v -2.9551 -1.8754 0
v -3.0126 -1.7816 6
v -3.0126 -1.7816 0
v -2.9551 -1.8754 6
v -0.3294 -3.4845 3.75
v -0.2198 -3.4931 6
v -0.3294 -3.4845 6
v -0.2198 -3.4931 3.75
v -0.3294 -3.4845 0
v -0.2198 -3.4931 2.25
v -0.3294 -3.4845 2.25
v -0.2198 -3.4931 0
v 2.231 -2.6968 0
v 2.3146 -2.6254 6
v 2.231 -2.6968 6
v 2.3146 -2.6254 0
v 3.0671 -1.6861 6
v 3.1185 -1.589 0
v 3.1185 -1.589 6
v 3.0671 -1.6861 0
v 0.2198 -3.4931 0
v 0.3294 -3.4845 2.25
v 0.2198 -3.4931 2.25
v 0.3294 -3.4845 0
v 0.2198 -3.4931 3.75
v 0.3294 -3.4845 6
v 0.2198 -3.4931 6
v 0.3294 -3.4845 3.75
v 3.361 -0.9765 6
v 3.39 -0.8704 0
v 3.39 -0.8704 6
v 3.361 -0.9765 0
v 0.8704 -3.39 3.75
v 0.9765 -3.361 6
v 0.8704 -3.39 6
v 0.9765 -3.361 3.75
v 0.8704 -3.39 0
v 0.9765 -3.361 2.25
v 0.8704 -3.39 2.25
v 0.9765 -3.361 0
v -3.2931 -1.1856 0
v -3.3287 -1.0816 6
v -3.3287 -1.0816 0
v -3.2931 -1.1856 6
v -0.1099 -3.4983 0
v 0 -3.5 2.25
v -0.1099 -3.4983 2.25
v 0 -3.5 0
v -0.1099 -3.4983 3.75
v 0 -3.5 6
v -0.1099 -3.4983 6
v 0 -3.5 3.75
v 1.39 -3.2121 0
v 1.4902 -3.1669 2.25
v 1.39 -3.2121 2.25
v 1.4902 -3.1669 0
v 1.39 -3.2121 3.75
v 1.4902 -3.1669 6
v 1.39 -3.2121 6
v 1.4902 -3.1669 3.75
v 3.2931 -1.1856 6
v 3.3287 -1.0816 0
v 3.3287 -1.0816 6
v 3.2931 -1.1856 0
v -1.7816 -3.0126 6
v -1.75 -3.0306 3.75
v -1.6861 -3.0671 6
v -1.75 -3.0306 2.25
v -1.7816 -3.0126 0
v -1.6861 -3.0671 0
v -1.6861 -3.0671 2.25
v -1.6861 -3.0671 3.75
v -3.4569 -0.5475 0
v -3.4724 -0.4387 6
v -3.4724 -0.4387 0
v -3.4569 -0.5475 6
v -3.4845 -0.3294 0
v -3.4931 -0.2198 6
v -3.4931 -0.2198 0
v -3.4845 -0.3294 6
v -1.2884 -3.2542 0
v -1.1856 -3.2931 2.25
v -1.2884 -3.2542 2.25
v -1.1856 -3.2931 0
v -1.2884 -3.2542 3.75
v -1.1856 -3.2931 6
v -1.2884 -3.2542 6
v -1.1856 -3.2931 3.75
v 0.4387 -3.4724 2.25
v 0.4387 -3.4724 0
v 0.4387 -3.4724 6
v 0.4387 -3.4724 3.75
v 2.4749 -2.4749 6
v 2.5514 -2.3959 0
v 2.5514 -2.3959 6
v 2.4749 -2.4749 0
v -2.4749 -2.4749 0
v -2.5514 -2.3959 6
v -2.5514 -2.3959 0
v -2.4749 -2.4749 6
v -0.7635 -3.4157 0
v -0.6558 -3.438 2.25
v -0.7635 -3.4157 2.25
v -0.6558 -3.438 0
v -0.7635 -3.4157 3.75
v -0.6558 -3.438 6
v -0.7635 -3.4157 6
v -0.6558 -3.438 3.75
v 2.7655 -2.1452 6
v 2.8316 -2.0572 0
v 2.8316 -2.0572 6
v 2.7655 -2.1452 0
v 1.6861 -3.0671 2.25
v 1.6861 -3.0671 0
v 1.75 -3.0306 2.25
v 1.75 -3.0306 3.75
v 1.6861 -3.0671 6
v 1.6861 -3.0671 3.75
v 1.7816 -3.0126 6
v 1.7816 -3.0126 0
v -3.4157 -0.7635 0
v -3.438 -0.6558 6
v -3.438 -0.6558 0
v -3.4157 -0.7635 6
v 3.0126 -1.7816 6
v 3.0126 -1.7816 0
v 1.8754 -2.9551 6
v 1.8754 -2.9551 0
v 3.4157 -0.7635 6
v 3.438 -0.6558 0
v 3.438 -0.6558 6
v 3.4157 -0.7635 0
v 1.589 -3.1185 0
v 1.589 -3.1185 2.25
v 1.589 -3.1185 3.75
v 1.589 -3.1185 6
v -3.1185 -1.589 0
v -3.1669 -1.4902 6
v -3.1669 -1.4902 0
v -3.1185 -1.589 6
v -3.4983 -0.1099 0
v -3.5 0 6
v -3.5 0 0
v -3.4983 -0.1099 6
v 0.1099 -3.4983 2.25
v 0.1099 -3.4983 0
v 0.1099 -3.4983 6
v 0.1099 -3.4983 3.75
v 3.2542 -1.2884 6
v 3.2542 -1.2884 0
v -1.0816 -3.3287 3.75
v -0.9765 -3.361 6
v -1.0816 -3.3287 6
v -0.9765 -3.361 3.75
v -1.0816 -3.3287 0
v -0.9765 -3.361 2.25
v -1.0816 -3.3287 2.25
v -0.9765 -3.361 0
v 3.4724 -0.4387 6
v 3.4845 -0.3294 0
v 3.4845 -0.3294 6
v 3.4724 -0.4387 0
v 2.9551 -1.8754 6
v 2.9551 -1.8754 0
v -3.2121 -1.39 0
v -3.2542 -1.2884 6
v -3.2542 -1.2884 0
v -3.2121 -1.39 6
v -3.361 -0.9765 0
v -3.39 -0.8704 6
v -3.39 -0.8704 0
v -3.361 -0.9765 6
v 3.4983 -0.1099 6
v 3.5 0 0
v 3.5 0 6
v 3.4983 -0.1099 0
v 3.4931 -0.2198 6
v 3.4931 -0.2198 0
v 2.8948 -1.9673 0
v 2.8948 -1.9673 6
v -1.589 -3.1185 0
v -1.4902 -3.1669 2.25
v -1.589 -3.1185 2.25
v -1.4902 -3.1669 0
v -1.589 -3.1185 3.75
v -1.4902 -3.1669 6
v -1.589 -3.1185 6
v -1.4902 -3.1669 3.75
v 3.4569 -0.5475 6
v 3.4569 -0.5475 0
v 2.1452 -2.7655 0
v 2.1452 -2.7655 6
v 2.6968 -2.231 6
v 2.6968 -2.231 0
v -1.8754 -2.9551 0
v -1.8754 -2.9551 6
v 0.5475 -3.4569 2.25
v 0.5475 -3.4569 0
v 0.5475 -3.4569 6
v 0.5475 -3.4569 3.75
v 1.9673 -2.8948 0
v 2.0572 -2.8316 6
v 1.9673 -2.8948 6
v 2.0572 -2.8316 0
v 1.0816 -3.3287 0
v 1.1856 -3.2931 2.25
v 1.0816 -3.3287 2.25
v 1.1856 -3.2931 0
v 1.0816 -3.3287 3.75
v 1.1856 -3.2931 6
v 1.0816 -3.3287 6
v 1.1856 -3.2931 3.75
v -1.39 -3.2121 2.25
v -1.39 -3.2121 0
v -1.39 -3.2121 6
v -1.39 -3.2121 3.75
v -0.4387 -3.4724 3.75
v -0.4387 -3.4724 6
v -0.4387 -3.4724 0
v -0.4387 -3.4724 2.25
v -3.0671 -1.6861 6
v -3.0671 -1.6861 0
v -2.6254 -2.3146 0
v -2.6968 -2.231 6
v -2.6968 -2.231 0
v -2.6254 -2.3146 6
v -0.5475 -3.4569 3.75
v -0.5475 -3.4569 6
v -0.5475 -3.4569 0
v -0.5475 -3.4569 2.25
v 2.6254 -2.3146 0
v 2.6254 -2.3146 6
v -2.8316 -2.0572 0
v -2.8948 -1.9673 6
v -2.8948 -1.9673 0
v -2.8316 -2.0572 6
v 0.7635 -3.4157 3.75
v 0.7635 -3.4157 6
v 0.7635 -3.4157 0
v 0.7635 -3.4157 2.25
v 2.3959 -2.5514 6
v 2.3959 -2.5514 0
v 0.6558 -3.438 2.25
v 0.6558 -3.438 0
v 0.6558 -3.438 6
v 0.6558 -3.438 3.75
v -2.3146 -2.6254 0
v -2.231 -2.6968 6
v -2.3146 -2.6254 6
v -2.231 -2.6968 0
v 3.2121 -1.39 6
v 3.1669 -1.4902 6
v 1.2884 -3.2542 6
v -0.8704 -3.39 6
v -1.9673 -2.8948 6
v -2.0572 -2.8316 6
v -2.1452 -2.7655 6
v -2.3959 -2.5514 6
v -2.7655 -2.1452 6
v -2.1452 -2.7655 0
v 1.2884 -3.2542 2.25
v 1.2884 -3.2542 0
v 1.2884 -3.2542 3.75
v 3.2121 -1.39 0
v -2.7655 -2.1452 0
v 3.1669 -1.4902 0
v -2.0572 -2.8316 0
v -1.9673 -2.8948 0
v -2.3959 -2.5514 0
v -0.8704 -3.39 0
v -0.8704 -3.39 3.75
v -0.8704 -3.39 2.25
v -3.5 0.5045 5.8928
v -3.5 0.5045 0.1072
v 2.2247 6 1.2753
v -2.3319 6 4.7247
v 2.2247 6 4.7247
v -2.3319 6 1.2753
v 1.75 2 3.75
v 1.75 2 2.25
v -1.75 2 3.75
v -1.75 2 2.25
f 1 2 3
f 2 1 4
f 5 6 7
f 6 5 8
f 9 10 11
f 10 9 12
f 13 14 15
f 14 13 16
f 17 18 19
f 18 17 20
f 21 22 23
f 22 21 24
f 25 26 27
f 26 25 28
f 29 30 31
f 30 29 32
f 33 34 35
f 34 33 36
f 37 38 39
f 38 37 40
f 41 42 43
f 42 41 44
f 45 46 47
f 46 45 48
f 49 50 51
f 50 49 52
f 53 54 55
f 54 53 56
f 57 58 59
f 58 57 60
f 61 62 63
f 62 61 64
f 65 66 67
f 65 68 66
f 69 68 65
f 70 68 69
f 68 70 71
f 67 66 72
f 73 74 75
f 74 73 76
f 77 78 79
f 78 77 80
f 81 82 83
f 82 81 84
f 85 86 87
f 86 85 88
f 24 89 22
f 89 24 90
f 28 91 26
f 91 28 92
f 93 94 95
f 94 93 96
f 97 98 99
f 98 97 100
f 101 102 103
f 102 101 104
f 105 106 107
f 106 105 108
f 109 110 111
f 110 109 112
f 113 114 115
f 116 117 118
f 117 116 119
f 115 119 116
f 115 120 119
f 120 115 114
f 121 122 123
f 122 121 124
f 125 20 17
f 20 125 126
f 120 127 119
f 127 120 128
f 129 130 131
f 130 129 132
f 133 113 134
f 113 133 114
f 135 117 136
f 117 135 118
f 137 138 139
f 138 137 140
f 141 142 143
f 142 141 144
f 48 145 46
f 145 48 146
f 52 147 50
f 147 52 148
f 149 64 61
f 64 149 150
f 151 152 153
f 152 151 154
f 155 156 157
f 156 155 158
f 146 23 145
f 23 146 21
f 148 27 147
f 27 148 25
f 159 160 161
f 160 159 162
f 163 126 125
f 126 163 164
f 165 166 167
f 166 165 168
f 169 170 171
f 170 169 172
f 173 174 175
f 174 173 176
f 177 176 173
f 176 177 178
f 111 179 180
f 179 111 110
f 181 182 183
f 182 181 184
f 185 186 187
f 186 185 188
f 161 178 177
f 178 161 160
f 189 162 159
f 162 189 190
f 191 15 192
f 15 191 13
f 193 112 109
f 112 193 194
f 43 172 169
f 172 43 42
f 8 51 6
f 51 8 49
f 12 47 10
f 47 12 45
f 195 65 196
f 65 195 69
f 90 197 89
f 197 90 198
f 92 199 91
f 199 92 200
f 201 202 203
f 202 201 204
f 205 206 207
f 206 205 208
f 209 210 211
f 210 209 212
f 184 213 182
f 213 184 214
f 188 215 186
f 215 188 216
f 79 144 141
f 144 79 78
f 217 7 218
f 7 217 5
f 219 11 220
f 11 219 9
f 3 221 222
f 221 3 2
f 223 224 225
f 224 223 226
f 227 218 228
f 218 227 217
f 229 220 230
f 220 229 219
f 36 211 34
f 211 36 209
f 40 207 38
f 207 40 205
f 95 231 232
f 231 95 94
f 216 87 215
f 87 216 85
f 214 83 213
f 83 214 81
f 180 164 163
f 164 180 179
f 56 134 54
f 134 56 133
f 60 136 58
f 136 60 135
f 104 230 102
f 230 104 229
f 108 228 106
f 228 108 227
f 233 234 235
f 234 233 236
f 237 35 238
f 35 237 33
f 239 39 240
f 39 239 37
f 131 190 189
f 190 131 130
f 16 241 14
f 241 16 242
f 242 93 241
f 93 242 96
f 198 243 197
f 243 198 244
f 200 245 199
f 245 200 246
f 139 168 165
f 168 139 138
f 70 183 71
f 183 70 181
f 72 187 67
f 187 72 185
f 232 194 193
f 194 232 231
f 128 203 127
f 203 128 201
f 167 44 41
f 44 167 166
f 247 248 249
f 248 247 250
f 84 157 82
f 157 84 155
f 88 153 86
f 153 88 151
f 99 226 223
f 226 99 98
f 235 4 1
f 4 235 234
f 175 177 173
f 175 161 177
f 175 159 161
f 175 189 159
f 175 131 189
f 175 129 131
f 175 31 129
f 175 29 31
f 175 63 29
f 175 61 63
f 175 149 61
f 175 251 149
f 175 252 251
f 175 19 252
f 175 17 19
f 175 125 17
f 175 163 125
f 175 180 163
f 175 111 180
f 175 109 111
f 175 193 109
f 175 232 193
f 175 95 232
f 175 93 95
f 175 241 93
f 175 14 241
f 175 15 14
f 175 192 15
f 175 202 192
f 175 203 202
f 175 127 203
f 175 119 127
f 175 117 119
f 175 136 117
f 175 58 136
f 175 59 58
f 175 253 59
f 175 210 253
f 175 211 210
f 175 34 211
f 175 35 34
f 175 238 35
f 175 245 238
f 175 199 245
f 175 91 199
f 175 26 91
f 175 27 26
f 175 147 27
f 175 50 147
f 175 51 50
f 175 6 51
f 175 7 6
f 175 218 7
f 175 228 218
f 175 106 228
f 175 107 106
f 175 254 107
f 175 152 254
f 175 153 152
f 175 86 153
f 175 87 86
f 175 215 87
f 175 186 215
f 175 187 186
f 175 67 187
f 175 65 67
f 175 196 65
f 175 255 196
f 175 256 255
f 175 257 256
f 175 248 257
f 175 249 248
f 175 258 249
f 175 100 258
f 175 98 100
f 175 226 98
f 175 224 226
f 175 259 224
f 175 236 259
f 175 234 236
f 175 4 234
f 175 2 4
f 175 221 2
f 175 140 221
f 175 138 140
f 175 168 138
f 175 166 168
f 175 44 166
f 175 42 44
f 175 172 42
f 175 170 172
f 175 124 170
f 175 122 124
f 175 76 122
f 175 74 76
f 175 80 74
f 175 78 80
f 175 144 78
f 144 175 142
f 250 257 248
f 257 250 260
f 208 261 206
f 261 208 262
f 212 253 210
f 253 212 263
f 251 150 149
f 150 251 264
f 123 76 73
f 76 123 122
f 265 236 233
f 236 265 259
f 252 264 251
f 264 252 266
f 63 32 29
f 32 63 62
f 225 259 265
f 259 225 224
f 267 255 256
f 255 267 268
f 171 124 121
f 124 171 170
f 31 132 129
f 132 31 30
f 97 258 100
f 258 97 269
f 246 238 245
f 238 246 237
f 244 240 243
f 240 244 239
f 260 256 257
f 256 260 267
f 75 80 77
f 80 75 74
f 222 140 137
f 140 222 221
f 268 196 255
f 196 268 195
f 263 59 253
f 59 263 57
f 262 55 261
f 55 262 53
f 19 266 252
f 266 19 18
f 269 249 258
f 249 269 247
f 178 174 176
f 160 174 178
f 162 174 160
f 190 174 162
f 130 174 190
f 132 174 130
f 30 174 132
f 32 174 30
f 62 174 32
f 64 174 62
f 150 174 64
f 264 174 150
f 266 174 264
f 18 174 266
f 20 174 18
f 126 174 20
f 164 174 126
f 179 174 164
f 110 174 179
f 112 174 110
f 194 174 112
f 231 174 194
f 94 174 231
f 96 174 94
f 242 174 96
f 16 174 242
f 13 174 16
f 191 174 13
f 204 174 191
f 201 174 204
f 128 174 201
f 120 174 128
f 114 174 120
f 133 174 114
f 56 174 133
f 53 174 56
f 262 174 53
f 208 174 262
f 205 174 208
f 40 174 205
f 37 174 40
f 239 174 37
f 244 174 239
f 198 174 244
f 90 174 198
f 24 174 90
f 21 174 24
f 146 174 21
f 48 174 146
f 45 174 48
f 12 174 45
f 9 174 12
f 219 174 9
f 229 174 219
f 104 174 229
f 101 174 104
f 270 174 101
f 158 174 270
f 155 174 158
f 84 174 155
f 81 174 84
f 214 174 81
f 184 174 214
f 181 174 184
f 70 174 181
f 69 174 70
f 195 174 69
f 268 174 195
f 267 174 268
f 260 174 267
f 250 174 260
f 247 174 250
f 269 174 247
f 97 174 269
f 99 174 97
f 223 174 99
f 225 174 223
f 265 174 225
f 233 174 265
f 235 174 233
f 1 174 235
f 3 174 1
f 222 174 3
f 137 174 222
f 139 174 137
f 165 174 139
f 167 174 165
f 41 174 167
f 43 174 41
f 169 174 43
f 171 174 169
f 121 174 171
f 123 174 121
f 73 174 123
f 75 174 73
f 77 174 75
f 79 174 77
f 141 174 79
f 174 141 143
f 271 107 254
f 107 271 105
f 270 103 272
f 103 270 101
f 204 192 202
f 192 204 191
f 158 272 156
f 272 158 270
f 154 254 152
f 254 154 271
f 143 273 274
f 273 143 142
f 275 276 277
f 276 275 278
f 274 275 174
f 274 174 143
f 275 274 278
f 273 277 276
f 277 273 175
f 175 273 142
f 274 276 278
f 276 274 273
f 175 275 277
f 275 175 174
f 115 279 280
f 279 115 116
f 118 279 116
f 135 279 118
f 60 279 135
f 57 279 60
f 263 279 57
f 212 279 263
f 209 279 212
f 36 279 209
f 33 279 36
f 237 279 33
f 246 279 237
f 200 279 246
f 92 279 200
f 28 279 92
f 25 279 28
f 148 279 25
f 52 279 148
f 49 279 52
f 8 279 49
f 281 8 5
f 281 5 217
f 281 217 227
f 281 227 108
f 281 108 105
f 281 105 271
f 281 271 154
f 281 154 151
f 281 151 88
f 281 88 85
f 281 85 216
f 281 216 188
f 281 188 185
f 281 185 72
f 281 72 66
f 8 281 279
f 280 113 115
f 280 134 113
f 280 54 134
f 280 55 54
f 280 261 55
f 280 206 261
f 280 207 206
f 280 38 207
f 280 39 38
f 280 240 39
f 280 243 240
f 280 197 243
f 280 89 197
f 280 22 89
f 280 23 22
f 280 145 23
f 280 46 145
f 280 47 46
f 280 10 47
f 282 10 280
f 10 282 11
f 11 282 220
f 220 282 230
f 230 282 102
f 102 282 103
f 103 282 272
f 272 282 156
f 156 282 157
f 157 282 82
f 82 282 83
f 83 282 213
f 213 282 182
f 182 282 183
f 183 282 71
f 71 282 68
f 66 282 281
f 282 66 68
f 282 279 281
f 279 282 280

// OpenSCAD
$fa = 1;
$fs = 0.5;
$fn = 200;

difference() {
  union() {
    cylinder(h=6, r=3.5);
    translate([-3.5,0,0]) cube([7,6,6]);
  }
  // bottom and top slice
  rotate([12,0,0]) translate([-5,0,-5]) cube([10,10,5]);
  translate([-5,0,6]) rotate([-12,0,0]) cube([10,10,5]);
  // right and left slice
  translate([-8.5,1.03,0]) rotate(a=-12,v=[0,0,1]) cube([5,10,10]);
  translate([3.5,0,0]) rotate(a=12,v=[0,0,1]) cube([5,10,10]);
  // post hole
  translate([-3.5/2,-3.7,(6-1.5)/2]) cube([3.5,5.7,1.5]);
}
